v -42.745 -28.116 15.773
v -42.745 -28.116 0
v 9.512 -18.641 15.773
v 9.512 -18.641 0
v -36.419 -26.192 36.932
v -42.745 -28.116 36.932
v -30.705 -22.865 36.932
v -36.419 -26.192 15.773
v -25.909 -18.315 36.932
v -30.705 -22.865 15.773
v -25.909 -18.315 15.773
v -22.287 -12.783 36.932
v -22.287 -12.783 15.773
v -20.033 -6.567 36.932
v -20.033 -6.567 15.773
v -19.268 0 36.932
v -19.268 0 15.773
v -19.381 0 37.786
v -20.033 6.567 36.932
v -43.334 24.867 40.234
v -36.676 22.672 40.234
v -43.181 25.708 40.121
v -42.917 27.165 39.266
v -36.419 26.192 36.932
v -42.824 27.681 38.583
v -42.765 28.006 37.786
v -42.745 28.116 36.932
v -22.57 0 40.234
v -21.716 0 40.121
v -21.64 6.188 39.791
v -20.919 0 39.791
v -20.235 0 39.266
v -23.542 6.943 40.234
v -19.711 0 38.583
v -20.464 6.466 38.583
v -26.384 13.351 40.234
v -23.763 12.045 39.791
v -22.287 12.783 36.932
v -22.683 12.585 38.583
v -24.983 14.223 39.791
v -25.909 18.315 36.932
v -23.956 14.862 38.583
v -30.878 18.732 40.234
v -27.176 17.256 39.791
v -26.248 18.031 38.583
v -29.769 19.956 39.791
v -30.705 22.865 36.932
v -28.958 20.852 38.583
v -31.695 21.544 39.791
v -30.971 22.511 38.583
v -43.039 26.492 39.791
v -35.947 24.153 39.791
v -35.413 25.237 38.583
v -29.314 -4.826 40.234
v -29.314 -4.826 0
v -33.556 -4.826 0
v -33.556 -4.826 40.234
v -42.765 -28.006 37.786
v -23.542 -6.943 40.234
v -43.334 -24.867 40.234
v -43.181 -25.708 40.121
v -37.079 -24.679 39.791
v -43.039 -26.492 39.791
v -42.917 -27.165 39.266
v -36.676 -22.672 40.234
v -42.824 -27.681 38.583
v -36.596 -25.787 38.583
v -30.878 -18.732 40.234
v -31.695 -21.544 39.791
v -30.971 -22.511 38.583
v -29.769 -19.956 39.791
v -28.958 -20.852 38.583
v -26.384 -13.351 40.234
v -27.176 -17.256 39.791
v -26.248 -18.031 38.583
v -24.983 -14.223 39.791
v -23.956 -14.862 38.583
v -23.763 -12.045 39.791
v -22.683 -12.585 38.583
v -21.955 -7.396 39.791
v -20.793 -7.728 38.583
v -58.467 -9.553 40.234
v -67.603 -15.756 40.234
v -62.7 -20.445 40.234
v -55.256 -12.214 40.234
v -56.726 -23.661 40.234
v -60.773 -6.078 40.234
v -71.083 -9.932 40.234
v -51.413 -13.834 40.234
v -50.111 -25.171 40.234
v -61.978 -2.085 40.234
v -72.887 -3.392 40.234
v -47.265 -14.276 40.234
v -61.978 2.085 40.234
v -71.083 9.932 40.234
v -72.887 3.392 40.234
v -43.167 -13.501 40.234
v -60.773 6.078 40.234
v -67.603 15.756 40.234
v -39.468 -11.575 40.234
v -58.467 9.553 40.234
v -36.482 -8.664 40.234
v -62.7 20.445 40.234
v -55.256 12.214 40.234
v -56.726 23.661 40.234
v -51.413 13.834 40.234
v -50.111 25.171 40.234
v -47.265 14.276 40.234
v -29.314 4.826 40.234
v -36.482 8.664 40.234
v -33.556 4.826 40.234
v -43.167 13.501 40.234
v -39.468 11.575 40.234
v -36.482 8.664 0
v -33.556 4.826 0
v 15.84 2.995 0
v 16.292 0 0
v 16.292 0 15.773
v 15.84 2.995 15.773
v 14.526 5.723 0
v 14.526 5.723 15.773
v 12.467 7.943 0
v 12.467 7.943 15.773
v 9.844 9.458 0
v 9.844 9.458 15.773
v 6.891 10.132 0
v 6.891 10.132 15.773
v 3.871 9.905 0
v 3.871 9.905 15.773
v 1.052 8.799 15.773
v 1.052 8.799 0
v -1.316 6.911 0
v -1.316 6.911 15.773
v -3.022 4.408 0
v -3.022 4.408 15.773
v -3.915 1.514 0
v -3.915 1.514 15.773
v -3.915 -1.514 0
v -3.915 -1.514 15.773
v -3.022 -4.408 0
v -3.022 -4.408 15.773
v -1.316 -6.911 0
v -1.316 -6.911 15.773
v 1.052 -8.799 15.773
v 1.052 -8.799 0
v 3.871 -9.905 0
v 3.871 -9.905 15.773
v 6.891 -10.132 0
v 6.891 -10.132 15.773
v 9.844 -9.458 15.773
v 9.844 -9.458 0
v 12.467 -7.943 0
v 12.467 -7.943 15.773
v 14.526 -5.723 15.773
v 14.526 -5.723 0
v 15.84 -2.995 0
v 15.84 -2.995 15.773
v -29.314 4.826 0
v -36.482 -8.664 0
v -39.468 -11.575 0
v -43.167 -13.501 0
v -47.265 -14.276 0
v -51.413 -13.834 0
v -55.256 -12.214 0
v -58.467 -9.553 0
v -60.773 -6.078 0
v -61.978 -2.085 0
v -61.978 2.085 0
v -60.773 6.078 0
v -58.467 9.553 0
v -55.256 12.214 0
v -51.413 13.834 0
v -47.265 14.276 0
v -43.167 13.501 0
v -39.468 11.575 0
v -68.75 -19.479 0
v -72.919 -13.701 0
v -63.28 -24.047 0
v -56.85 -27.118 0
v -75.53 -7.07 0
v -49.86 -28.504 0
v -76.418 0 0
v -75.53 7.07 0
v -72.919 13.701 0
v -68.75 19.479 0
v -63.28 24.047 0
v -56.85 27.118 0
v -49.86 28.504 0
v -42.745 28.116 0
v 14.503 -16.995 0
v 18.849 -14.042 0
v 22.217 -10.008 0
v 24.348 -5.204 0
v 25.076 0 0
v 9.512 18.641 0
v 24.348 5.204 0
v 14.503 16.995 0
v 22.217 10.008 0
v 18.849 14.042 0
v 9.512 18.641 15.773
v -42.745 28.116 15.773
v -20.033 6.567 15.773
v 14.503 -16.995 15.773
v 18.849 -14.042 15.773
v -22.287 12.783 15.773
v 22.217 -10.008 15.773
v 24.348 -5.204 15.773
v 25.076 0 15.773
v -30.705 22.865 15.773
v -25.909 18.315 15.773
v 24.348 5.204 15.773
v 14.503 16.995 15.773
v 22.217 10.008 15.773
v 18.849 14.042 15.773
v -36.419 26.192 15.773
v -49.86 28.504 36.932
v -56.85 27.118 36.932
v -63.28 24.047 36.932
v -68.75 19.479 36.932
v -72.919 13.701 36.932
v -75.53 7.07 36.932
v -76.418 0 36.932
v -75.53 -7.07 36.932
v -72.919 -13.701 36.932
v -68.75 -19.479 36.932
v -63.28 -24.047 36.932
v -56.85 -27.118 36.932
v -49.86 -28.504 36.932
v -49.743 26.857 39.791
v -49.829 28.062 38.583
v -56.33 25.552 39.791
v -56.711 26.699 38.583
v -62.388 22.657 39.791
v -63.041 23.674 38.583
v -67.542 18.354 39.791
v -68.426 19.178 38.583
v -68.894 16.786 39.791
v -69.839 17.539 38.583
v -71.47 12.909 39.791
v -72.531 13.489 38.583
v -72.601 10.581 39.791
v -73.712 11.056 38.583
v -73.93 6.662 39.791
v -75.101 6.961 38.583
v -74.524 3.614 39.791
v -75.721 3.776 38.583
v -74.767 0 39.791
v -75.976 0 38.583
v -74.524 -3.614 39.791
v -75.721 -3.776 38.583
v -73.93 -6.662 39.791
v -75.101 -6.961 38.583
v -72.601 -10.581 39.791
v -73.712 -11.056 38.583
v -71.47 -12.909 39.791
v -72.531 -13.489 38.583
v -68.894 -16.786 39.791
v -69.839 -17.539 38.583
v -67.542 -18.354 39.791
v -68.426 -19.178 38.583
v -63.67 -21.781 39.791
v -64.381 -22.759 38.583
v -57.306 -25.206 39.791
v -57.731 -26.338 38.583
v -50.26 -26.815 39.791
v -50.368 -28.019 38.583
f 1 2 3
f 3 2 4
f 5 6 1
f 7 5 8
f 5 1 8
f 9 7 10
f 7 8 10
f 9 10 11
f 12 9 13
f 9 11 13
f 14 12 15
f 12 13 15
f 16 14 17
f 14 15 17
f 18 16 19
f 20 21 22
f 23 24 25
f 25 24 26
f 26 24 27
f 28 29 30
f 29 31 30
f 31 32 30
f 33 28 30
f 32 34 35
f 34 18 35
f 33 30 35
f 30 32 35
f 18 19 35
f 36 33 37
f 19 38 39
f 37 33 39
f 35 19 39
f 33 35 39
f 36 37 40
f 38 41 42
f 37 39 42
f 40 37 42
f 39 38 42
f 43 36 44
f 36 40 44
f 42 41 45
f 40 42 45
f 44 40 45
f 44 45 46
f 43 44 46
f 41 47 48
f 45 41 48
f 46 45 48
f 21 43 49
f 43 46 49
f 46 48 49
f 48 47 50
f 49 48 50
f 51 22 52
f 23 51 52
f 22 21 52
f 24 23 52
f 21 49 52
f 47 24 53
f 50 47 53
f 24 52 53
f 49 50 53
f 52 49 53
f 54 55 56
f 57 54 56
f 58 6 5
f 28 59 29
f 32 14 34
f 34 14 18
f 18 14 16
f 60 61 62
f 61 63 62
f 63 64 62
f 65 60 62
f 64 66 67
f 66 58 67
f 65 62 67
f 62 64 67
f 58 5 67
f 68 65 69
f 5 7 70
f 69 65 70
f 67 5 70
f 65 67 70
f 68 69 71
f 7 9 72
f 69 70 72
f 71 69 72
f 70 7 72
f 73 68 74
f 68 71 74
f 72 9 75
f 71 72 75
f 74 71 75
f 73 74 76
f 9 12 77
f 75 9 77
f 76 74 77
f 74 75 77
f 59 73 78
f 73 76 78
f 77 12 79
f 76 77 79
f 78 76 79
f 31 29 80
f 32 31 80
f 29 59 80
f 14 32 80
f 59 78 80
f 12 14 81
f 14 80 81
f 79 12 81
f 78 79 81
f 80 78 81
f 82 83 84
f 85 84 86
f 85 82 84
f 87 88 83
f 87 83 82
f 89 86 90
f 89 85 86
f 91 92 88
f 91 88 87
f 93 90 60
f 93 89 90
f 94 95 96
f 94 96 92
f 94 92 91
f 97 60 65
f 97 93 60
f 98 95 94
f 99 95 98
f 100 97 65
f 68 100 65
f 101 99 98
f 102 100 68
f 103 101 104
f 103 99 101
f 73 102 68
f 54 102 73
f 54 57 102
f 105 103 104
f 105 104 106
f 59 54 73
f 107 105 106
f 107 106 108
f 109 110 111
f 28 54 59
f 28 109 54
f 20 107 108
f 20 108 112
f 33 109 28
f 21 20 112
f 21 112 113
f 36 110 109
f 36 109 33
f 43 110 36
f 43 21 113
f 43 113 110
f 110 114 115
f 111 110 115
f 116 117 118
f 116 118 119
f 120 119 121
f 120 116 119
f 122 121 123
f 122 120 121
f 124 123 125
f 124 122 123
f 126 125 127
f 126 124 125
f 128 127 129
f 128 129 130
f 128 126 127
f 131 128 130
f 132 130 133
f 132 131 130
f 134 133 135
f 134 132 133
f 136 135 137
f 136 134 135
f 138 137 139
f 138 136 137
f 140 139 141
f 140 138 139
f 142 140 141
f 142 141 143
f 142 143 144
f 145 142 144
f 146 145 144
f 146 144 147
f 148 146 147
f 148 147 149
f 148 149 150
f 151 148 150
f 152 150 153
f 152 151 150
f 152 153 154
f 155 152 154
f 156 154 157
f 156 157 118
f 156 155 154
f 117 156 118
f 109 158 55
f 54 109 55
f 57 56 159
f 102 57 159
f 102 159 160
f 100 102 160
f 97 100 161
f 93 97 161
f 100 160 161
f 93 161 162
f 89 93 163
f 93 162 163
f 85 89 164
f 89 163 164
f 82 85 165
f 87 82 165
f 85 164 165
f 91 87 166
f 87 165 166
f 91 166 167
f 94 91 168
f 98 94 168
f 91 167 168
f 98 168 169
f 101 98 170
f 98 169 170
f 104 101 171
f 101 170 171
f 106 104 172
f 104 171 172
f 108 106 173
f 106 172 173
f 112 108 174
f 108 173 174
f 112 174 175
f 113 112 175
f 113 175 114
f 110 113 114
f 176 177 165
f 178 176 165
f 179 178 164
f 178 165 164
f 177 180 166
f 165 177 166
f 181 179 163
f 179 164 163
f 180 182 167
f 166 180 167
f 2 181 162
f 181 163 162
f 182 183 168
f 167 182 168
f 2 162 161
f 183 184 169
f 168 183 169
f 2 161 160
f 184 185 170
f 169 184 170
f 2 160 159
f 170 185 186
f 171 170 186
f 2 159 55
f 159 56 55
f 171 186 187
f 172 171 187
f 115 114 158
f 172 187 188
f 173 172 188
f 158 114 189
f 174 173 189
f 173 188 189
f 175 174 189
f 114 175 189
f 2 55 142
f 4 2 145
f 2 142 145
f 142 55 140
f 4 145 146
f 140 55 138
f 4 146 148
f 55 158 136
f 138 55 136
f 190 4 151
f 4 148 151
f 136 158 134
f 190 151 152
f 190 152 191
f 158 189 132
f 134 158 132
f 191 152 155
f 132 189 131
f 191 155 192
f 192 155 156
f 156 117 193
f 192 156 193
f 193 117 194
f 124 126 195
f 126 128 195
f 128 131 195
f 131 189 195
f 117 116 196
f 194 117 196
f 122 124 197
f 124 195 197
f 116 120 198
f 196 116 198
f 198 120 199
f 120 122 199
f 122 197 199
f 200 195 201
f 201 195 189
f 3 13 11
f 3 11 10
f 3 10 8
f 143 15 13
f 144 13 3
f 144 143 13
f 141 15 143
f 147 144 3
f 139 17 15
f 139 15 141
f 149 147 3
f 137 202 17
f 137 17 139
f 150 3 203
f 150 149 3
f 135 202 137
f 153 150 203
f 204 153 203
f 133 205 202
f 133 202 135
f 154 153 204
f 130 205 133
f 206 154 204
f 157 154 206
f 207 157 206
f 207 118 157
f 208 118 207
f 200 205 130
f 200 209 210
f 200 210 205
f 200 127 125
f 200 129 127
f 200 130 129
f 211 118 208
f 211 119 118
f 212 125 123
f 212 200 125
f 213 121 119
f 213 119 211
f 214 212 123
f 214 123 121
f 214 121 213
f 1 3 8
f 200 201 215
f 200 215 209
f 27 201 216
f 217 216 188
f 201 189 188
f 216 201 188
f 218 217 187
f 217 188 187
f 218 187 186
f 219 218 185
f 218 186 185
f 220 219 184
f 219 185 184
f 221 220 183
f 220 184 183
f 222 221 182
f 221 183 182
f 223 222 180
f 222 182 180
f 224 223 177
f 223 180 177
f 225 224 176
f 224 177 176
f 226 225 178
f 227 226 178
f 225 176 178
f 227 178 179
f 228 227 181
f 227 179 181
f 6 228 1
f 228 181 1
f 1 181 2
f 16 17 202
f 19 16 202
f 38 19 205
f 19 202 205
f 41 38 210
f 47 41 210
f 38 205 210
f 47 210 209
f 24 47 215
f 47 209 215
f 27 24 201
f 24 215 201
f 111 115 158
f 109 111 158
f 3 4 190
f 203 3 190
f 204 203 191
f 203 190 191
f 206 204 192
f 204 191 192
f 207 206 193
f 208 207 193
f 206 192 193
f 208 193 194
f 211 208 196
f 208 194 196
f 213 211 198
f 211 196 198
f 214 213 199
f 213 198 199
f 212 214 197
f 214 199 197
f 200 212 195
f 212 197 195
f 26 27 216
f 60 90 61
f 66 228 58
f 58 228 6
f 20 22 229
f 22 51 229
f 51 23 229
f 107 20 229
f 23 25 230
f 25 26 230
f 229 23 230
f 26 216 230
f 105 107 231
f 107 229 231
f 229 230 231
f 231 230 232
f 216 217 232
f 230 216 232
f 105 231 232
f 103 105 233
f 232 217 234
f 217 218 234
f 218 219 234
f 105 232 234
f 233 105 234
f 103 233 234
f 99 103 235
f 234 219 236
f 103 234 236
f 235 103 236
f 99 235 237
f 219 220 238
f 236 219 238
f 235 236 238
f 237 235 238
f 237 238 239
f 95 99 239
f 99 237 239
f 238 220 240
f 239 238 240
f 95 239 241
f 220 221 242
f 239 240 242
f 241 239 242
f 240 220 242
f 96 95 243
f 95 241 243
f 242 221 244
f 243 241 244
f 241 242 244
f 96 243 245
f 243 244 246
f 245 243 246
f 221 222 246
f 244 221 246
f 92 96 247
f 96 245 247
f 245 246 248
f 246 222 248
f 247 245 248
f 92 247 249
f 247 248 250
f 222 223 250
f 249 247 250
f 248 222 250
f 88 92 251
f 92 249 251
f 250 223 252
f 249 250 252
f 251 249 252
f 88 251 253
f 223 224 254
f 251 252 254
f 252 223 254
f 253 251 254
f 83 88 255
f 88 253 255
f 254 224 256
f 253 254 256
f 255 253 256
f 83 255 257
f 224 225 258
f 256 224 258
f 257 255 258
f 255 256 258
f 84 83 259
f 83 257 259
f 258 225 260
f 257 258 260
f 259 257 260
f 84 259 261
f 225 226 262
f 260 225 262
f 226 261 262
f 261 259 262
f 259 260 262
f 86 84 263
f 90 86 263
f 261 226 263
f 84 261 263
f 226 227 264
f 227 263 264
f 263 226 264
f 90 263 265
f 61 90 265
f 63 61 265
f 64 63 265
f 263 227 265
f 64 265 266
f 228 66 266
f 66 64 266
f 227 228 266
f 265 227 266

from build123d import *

# Parameters (mm, degrees)
F0_R     = 10.16
F1_DEPTH = 15.7734
F2_DEPTH = 40.2336
F3_R     = 3.302


with BuildPart() as f1:
    # F0 (on Top) → F1 (new body)
    with BuildSketch(Plane.XY):
        with BuildLine():
            ThreePointArc((-42.744664, 28.116476), (-25.908921, 18.3145), (-19.268134, 0))
            ThreePointArc((-19.268134, 0), (-25.908921, -18.3145), (-42.744664, -28.116476))
            Line((-42.744664, -28.116476), (9.512032, -18.640565))
            ThreePointArc((9.512032, -18.640565), (25.076422, 0), (9.512032, 18.640565))
            Line((9.512032, 18.640565), (-42.744664, 28.116476))
        make_face()
        with Locations((6.131866, 0)):
            Circle(F0_R, mode=Mode.SUBTRACT)
    extrude(amount=F1_DEPTH)

    # F0 (on Top) → F2 (join)
    with BuildSketch(Plane.XY):
        with BuildLine():
            ThreePointArc((-42.744664, -28.116476), (-25.908921, -18.3145), (-19.268134, 0))
            ThreePointArc((-19.268134, 0), (-25.908921, 18.3145), (-42.744664, 28.116476))
            ThreePointArc((-42.744664, 28.116476), (-76.418134, 0), (-42.744664, -28.116476))
        make_face()
        with BuildLine():
            ThreePointArc((-36.481987, -8.663543), (-62.130634, 0), (-36.481987, 8.663543))
            Line((-36.481987, 8.663543), (-33.555634, 4.826))
            Line((-33.555634, 4.826), (-29.313834, 4.826))
            Line((-29.313834, 4.826), (-29.313834, 0))
            Line((-29.313834, 0), (-29.313834, -4.826))
            Line((-29.313834, -4.826), (-33.555634, -4.826))
            Line((-33.555634, -4.826), (-36.481987, -8.663543))
        make_face(mode=Mode.SUBTRACT)
    extrude(amount=F2_DEPTH)

    # F3
    f3_edges = [f1.edges().sort_by_distance(p)[0] for p in [
        (-52.941605, 28.116476, 40.2336),
    ]]
    fillet(f3_edges, radius=F3_R)


solid = f1.part
